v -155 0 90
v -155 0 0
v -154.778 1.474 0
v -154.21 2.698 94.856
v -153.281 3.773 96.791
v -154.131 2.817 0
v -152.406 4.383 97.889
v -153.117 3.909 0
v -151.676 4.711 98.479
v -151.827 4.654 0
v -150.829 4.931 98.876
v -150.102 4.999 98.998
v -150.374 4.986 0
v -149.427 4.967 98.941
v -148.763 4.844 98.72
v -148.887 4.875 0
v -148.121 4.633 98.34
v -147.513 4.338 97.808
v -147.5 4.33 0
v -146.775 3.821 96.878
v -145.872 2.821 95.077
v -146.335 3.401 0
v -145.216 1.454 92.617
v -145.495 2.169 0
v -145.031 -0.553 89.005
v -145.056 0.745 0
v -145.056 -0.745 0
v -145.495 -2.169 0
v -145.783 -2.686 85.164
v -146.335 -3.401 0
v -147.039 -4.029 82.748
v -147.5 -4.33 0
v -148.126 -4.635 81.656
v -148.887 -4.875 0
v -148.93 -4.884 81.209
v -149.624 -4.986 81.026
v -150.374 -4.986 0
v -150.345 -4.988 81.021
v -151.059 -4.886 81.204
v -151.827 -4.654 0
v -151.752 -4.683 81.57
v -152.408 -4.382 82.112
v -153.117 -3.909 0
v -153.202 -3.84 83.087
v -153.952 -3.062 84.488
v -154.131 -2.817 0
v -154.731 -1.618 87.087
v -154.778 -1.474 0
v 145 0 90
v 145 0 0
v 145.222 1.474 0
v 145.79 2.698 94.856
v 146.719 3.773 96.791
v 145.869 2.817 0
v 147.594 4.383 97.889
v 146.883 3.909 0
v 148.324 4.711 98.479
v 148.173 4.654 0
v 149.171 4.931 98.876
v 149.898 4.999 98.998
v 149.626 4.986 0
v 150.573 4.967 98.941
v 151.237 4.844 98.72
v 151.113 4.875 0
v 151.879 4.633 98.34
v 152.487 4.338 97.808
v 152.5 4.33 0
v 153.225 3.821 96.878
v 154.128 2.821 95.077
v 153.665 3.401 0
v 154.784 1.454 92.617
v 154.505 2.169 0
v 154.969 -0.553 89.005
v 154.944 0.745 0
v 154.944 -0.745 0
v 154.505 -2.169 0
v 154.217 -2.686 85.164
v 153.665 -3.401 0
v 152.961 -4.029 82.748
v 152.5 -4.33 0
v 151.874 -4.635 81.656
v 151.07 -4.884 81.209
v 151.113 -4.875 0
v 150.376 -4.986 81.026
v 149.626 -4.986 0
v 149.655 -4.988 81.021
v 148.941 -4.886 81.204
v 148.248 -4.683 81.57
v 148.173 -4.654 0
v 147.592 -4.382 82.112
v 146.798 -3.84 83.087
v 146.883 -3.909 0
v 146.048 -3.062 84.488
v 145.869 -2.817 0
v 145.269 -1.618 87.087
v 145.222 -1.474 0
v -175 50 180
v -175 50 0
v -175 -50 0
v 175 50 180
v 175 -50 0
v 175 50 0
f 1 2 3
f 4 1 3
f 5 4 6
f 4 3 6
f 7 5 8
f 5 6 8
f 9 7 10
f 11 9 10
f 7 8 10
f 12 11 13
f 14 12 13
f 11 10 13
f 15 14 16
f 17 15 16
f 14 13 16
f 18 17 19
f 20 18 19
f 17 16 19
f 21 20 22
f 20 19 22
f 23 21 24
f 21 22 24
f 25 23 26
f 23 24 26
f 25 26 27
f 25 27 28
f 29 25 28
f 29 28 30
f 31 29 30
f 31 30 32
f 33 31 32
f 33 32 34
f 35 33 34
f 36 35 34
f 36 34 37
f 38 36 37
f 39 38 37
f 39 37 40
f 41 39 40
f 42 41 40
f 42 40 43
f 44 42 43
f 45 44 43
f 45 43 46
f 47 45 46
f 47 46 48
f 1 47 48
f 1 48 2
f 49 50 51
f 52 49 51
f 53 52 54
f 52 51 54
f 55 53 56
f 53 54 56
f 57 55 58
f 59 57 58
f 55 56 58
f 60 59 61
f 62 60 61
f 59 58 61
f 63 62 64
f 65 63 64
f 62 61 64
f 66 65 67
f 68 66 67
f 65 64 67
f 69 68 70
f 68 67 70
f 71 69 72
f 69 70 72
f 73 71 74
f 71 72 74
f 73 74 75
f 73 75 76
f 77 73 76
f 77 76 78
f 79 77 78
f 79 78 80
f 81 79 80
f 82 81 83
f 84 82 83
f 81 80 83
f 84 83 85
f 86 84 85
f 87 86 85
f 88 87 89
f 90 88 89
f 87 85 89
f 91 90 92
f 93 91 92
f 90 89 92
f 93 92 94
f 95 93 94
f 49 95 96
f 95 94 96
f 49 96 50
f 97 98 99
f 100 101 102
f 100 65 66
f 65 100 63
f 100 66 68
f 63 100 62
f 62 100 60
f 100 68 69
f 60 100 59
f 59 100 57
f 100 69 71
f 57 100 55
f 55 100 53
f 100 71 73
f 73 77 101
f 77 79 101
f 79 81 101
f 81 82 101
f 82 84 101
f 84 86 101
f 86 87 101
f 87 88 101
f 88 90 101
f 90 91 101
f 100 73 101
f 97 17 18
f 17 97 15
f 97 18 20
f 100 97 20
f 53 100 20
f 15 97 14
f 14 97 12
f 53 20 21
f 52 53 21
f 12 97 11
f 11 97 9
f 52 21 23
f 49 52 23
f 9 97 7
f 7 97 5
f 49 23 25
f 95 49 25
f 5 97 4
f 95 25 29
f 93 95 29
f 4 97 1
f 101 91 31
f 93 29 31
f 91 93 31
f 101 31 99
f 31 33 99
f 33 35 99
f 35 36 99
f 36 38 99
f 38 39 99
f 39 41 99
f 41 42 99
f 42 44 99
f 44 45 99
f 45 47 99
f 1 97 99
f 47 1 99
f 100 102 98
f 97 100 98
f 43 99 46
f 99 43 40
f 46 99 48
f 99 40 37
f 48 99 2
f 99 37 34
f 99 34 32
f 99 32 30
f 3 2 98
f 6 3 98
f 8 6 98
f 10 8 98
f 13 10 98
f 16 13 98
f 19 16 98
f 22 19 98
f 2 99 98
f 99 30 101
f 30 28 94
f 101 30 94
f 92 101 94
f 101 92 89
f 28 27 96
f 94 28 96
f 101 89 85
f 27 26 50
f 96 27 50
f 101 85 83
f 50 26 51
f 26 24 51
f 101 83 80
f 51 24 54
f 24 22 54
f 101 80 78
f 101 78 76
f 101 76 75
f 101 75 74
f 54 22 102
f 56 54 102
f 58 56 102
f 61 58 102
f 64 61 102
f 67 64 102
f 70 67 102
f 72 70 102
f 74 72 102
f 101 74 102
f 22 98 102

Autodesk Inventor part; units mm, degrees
ref_plane "YZ Plane" through (0, 0, 0) normal (1, 0, 0) x (0, 1, 0)
ref_plane "XZ Plane" through (0, 0, 0) normal (0, 1, 0) x (-1, 0, 0)
ref_plane "XY Plane" through (0, 0, 0) normal (0, 0, 1) x (1, 0, 0)
sketch "Sketch1" plane through (0, 0, 0) normal (0, 0, 1) x (1, 0, 0)
  line L0 (-175, -50) -> (175, -50)
  line L1 (175, -50) -> (175, 50)
  line L2 (175, 50) -> (-175, 50)
  line L3 (-175, 50) -> (-175, -50)
  line L4 (-175, -50) -> (175, 50) construction
  line L5 (175, -50) -> (-175, 50) construction
  point P0 (0, 0)
  dimension "d0" = 350
  dimension "d1" = 100
extrude "Extrusion1" add sketch "Sketch1" along normal blind 180
sketch "Sketch2" plane through (-175, -50, 0) normal (-1, 0, 0) x (0, 0, 1)
  line L0 (180, 0) -> (180, 100) projected
  line L1 (180, 100) -> (0, 0)
  line L2 (0, 0) -> (196.9773, -61.362)
  line L3 (196.9773, -61.362) -> (180, 100)
  point P0 (0, 50)
extrude "Extrusion2" cut sketch "Sketch2" against normal through all
sketch "Sketch3" plane through (0, 0, 0) normal (0, 0, -1) x (-1, 0, 0)
  circle A0 centre (150, 0) radius 5
  line L0 (-175, 50) -> (175, 50) projected
  line L1 (175, -50) -> (-175, -50) projected
  circle A1 centre (-150, 0) radius 5
  point P0 (0, 0)
  dimension "d8" = 10
extrude "Extrusion3" cut sketch "Sketch3" against normal through all
properties part number "Banco"
